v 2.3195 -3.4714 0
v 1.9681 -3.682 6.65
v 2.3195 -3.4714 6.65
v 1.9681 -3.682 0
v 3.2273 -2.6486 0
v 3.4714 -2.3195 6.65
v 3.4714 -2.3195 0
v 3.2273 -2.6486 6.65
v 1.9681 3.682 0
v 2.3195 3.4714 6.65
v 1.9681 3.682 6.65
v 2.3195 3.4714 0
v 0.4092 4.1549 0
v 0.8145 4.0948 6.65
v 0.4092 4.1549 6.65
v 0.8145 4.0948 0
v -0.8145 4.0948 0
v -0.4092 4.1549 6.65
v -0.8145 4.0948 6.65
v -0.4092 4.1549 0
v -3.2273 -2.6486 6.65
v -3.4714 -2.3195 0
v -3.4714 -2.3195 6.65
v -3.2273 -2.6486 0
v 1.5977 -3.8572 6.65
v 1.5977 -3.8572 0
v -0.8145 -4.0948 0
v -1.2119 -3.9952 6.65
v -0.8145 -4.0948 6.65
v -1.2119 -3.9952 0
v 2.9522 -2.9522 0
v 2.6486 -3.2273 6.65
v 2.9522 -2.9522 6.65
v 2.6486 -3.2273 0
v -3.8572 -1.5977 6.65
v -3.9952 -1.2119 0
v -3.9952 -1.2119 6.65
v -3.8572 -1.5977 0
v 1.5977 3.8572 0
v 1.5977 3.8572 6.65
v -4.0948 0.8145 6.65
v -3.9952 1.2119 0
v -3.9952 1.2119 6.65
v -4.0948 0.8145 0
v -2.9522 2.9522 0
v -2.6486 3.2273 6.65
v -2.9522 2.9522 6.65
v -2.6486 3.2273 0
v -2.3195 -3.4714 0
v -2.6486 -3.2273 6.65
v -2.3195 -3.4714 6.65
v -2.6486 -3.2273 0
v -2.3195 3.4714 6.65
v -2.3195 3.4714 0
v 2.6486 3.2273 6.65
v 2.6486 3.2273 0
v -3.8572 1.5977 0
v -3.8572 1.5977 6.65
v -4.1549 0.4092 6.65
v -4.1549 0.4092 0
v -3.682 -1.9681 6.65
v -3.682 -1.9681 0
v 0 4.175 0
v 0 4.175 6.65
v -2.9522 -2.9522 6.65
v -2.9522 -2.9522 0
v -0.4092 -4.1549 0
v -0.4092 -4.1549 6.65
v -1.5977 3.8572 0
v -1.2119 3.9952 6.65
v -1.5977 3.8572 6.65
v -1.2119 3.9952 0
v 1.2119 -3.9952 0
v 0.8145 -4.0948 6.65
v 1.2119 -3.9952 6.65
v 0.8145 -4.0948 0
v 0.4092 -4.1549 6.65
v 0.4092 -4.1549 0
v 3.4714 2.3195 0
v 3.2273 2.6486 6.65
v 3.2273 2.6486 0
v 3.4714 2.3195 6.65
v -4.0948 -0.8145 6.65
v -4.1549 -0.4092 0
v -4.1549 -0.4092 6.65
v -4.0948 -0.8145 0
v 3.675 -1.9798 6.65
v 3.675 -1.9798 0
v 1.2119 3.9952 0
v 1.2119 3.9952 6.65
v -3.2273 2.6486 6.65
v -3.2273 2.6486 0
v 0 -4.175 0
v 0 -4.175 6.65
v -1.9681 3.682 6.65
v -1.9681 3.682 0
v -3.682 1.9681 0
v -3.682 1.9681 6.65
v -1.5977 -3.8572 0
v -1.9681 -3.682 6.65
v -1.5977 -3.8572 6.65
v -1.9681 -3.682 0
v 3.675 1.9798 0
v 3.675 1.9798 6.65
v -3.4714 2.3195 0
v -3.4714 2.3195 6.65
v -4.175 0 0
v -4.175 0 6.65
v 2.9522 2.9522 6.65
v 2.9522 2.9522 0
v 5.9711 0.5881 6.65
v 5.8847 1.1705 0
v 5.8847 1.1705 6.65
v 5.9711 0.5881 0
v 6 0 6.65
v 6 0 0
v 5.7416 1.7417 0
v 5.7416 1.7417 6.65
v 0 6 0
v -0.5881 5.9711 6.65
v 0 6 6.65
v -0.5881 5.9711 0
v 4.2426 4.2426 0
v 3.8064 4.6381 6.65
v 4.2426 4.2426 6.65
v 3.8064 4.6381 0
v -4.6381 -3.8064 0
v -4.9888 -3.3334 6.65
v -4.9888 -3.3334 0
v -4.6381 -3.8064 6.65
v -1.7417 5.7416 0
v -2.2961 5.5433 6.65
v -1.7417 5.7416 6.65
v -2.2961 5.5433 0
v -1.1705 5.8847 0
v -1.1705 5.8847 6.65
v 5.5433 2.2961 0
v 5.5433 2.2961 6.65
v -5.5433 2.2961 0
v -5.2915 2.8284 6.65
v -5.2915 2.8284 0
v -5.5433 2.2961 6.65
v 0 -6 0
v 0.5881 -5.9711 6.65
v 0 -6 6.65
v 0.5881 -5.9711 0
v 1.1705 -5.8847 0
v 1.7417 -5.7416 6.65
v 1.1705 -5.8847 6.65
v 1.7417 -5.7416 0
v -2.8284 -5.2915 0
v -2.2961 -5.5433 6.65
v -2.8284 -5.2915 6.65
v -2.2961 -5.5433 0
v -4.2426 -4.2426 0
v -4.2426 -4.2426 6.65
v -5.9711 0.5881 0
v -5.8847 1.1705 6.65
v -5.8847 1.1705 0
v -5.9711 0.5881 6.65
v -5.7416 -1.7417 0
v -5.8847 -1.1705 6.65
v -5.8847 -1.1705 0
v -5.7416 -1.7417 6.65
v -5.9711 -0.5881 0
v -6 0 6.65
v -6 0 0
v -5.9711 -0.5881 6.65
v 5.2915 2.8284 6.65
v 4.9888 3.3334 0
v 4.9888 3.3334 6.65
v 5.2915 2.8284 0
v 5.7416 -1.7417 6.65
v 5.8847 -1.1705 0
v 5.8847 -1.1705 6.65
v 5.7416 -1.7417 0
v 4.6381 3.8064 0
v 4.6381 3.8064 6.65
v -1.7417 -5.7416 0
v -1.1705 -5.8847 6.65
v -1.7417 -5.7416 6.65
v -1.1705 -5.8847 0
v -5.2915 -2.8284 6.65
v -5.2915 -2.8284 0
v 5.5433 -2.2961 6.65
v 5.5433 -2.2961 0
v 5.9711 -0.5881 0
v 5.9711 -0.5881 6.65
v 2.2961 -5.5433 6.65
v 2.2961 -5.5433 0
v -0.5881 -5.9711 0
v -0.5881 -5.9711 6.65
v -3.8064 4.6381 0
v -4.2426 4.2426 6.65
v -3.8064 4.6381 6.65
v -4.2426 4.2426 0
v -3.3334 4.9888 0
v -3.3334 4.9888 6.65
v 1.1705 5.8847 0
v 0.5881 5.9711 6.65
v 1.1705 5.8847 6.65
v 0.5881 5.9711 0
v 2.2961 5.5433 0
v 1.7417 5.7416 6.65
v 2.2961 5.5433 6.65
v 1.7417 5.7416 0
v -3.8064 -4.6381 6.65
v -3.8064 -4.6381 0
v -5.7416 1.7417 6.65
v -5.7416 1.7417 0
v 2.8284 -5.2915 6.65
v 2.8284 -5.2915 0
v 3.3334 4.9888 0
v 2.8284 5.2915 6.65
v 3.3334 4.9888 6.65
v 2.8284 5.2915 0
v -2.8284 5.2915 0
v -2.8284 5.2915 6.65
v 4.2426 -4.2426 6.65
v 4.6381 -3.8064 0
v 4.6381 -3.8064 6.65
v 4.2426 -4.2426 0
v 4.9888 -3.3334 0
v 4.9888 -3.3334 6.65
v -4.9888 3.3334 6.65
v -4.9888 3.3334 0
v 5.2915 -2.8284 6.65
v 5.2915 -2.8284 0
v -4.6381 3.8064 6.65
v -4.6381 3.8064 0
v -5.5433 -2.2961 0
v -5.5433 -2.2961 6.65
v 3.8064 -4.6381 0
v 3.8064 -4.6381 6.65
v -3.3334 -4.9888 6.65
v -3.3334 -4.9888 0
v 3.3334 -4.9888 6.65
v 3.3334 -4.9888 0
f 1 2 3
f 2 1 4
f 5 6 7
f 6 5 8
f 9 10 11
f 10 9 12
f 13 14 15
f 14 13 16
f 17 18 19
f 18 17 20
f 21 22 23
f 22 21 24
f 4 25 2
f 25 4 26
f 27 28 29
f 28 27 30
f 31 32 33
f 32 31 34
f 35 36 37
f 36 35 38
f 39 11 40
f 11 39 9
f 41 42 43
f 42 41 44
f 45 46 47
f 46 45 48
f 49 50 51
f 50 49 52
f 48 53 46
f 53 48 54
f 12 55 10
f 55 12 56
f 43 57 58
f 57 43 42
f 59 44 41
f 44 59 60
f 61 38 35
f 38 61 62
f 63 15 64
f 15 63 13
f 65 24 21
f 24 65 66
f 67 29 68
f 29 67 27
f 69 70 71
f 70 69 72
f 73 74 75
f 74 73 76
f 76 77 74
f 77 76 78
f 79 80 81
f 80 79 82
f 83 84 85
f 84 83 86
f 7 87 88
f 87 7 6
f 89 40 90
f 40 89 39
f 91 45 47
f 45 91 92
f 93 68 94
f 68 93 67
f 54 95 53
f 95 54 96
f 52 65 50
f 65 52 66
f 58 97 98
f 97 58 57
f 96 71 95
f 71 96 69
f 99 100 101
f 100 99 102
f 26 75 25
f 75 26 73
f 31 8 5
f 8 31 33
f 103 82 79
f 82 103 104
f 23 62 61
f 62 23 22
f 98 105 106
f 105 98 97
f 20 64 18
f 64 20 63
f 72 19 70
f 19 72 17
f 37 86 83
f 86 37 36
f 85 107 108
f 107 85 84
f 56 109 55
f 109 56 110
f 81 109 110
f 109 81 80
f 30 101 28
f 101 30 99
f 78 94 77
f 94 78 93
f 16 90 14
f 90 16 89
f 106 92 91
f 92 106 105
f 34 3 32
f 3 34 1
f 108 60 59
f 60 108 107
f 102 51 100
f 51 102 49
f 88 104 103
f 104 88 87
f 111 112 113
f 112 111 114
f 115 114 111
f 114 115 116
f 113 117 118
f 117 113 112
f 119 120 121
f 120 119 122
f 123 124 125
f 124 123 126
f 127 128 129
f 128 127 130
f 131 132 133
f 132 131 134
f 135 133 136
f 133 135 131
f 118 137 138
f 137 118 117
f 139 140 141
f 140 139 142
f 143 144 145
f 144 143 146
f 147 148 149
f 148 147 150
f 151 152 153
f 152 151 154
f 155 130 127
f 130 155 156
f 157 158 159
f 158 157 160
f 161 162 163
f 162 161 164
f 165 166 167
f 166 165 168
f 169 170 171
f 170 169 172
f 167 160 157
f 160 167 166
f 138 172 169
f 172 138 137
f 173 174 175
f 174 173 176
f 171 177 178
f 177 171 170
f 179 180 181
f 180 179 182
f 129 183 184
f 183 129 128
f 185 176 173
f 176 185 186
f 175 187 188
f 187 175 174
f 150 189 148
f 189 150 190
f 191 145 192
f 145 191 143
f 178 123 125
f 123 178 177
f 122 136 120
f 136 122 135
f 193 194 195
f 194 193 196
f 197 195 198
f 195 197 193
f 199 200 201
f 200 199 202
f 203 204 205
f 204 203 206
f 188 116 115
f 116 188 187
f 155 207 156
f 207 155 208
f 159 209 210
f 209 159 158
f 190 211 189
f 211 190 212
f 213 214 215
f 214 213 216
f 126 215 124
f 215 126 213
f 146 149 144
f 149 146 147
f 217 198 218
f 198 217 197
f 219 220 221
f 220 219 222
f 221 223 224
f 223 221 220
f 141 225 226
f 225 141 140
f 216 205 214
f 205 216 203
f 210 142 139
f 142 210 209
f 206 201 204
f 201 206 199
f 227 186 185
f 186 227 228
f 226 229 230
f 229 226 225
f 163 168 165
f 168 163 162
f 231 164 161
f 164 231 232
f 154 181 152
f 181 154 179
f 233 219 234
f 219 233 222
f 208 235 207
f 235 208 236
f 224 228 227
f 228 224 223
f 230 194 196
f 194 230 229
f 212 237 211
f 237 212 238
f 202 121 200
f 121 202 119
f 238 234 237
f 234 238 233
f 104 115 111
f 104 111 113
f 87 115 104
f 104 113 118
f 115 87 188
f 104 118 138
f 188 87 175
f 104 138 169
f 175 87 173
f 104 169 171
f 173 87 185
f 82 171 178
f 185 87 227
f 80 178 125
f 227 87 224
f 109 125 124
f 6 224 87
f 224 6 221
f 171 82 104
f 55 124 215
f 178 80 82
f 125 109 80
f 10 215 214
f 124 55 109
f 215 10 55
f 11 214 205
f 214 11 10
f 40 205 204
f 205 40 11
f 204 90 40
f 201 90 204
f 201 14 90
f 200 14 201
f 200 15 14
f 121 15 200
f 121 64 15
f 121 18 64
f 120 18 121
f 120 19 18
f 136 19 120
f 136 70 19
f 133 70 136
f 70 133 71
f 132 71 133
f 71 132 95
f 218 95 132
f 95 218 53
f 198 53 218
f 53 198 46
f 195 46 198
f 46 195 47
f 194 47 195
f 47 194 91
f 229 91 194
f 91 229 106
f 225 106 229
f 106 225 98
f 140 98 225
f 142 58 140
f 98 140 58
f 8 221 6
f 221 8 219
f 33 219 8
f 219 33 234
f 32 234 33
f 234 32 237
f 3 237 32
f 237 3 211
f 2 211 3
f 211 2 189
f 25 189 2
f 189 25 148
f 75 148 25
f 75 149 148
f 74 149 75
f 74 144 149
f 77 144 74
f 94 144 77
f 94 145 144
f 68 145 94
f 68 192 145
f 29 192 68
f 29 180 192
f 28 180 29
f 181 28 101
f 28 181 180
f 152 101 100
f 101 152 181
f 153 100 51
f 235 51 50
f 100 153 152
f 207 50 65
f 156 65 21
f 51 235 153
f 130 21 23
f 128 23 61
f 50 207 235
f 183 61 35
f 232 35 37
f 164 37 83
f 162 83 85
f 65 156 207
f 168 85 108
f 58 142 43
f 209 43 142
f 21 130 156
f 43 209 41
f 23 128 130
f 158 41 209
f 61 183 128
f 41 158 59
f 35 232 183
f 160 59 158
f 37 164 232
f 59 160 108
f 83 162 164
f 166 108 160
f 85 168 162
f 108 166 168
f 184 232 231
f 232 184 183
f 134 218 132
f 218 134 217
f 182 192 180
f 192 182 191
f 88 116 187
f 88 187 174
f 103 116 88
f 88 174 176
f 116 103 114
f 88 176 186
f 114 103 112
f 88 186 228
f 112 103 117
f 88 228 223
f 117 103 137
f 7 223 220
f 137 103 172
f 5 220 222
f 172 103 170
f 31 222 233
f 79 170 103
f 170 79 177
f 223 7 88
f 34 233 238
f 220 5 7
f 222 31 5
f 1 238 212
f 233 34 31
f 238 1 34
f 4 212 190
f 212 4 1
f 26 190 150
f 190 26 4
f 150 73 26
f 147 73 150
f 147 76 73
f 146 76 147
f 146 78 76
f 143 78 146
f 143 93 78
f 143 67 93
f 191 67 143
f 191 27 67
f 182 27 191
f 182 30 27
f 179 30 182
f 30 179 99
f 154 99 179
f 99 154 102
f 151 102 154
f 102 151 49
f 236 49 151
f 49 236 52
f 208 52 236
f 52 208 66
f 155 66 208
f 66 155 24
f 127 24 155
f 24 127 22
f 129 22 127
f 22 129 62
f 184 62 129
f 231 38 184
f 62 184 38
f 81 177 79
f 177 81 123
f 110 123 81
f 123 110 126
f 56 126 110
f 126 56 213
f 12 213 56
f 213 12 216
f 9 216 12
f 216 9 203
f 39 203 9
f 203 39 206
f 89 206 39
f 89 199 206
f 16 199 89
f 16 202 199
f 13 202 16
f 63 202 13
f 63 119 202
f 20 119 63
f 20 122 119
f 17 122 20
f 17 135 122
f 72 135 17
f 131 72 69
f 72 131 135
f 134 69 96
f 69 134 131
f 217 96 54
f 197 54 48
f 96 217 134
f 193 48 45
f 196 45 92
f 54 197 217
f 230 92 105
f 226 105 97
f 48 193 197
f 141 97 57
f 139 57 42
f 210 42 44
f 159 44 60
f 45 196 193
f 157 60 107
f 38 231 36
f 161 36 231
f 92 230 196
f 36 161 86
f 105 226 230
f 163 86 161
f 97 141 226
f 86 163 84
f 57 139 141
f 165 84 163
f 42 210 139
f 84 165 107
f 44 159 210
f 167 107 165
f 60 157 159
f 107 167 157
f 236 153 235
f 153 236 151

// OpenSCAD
// file: parameters.scad
// =============================================================================
// Gen-CB — nightly 2026-10-13 (physics_scorer, honest magpylib watts)
// Wire-saver stator for the Gen-CA rotors: only 4.05 mm of copper (9 layers), so the magnet faces are 6.65 mm apart and peak Bz at the copper reaches ≈0.70 T. It needs ≈300 m of wire (≈80 m less than Gen-CA, ≈75 m less than Gen-BX) and still out-scores the Gen-BX champion; it shares every rotor part, the steel, the frame rods and the bearing bridges with Gen-CA, so the two stators swap on the same machine.
// Clocking 0 deg (magnets N facing S) + D-flat keyed bore + index notch + flip-symmetric hole map.
// Windable 2-piece bobbin; turns = physics_scorer turns_fit; copper only between flanges.
// Steel back-iron: 2× Ø194 × 4.76 mm (3/16") mild-steel discs (steel_backiron_disc.dxf); magnets sit ON the steel
// (through-pockets) -> score with --back-iron. Night 2026-10-13.
// =============================================================================
topology            = "dual_rotor";

// --- Wire / winding (physics_scorer winding-fit) -------------------------------
wire_awg            = 26;
wire_od             = 0.45;     // insulated OD mm (bare 0.405)
fill_realistic      = 0.65;     // insulated-wire area / window (DENSE layered wind with a jig; scorer cap 0.65)
turns               = 292;       // = physics_scorer turns_fit (do NOT raise)
coil_former_type    = "bobbin";
coil_core_inset     = 17.70;     // radial copper build: hub = copper boundary inset by this
wind_build_axial    = 0.0;      // nothing proud of the flanges
wind_build_radial   = 0.0;

// --- Bobbin (base + lid) ---------------------------------------------------------
coil_id_r           = 63.00;    // copper boundary sector
coil_od_r           = 102.00;
span_deg            = 26.82;    // = pitch - 2*asin((wall+0.85)/coil_id_r) -> >=1.2 mm stator web
former_web          = 4.05;     // copper height between flanges (TALL copper: steel keeps Bz up)
flange_t            = 0.80;     // >= 0.8 mm FDM wall rule (tall winds push on the flanges)
wall                = 0.80;     // flange lip beyond copper
former_bare_h       = former_web + 2 * flange_t;
coil_envelope_h     = former_bare_h + 2 * wind_build_axial;
tab_w               = 7.0;
tab_len             = 7.0;
tab_h               = former_bare_h / 2;
pin_d               = 1.9;      // 1.75 mm filament locating pin
coil_mount_r        = coil_od_r + 0.2 + 4.0;
lead_y              = 1.6;
lead_slot_w         = 0.9;
lead_groove_d       = 0.6;

// --- Gap -------------------------------------------------------------------------
run_clear           = 0.50;     // rotor face -> flange
gap_spacer_h        = run_clear + wind_build_axial;
m2m                 = coil_envelope_h + 2 * run_clear;   // rotor face to rotor face (= gap_sleeve length)

// --- Stator ----------------------------------------------------------------------
coil_stations       = 12;
bay_clear           = 0.35;     // 0.35 mm: bobbin BASES print IN PLACE inside the stator bays (print-in-place gap), then pop out
stator_thick        = former_bare_h;                        // bobbins flush both faces
stator_od           = 225.0;
shaft_clear_stator  = 14.0;     // stator is static; gap sleeve OD 12 spins inside
stator_ir           = 57.85;    // ANNULAR stator: open centre (nested one-plate pack); inner rim 4.0 mm

// --- Rotor(s) --------------------------------------------------------------------
magnet_Br           = 1.43;     // N52
magnet_d_large      = 20.0;
magnet_h_large      = 5.0;      // one O20x5 per pocket
magnet_h_small      = 5.0;      // unused: no O5 pockets in this kit
halbach_magnetisation = "none";  // NO O5 assist magnets in this kit (scan: they lower the 4-pole score)
rotor_b_same_axis   = true;     // same-index magnets share one axis: N faces S across the gap
large_pocket_d      = 20.3;
small_pocket_d      = 5.3;
pocket_h            = 5.00;     // THROUGH the carrier: magnet back face sits on the steel disc (FLUSH seat: carrier = magnet height, magnet face level with the rotor face)
large_n             = 8;
R_large             = 84.0;
small_r_list        = [];       // no O5 pockets
carrier_od          = 194.0;
ring_ir             = 70.85;    // RING rotor: PLA magnet ring r ring_ir..carrier_od/2 (steel disc = structural rotor)
hub_flange_od       = 74.0;     // separate rotor_hub flange (inside the ring, flush with the ring face)
csk_d               = 6.6;      // M3 countersunk head pocket (ISO 10642 head 6.0 nominal) on the stator face
csk_depth           = 1.55;     // = (csk_d - m3_clear) / 2: 90 deg cone; head sits 0.3 mm below the face
n_seg               = 8;        // magnet-carrier ARCS per rotor (segmented carrier)
seg_deg             = 360 / n_seg;
seg_start           = -22.5;   // arc edge angle (between pocket 0 and its clamp bolt)
seg_kerf_deg        = 0.4;      // gap between neighbouring arcs on the steel
carrier_thick       = pocket_h;
hub_h               = 12.0;     // > steel_t + insert: radial set-screw clears the steel
hub_od              = 24.0;     // slim hub so the M4 brace rods fit at R~18 inside the coil ring
hub_insert_d        = 4.0;      // M3 heat-set insert, radial, bears on the D-flat
rotor_b_offset_deg  = 0.0;      // CLOCKING: magnets directly opposite
shaft_key           = "dflat";
dflat_depth         = 0.5;      // 8 mm shaft with 0.5 mm flat (7.5 across flat)
index_notch_d       = 3.0;

// --- Steel back-iron (buyable laser-cut) -------------------------------------------
steel_t             = 4.76;      // mild steel thickness (image method ignores it; sized from steel_flux.py so the return path stays well below saturation)
steel_center_hole   = 26.0;     // slips over the rotor hub (OD 24)
steel_od            = carrier_od;   // steel disc OD = rotor carrier OD

// --- Modular MAX interface ----------------------------------------------------------
shaft_bore          = 8.35;
dflat_x             = 4.0 - dflat_depth + (shaft_bore - 8.0) / 2;
bearing_d           = 21.85;
bearing_h           = 7.2;
m3_clear            = 3.5;
bolt_r_inner        = 30.0;     // M3 steel-disc clamp bolts (inside the magnet ring)
bolt_n_inner        = 4;
bolt_inner_angles   = [0, 90, 180, 270];
bolt_r_outer        = 84.0;     // second M3 steel-disc clamp ring
bolt_outer_angles   = [22.5, 67.5, 112.5, 157.5, 202.5, 247.5, 292.5, 337.5];
flange_bolt_r       = 107.5;     // frame rods: OUTSIDE the rotor OD (rotors spin inside them)
flange_bolt_n       = 4;
flange_bolt_offset  = 45.00;    // between coil stations -> never cuts a lead groove/tab
brace_r             = 18.0;
brace_d             = 4.3;      // temporary M4 jack rods (assembly only)
brace_n             = 4;
brace_angles        = [45, 135, 225, 315];          // flip-symmetric

spacer_pad_od       = 14.0;
spacer_pad_id       = m3_clear;
endbell_od          = 225.0;
endbell_thick       = 8.0;
endbell_shaft_clear = 10.0;
collar_h            = 10.0;
standoff_od         = 9.0;
frame_standoff_h    = run_clear + carrier_thick + hub_h + collar_h + 2.0;
sleeve_od           = 12.0;
plate_max_mm        = 410;

$fn = 64;
// main file
// Gen-CB — gap sleeve: rigid spacer on the shaft BETWEEN the two rotor carriers (passes through the stator
// hole). Length = m2m, so it sets the magnet gap and carries the full magnet pull. Print x1, upright.
include <parameters.scad>;
$fn = 64;
// D-flat keyed bore: flat faces +X (angle 0 = magnet pocket 0 = index notch)
module dflat_bore(h) {
    intersection() {
        cylinder(d=shaft_bore, h=h);
        translate([-shaft_bore, -shaft_bore, 0]) cube([shaft_bore + dflat_x, 2*shaft_bore, h]);
    }
}

difference() {
    cylinder(d=sleeve_od, h=m2m);
    translate([0, 0, -0.1]) dflat_bore(m2m + 0.2);
}
